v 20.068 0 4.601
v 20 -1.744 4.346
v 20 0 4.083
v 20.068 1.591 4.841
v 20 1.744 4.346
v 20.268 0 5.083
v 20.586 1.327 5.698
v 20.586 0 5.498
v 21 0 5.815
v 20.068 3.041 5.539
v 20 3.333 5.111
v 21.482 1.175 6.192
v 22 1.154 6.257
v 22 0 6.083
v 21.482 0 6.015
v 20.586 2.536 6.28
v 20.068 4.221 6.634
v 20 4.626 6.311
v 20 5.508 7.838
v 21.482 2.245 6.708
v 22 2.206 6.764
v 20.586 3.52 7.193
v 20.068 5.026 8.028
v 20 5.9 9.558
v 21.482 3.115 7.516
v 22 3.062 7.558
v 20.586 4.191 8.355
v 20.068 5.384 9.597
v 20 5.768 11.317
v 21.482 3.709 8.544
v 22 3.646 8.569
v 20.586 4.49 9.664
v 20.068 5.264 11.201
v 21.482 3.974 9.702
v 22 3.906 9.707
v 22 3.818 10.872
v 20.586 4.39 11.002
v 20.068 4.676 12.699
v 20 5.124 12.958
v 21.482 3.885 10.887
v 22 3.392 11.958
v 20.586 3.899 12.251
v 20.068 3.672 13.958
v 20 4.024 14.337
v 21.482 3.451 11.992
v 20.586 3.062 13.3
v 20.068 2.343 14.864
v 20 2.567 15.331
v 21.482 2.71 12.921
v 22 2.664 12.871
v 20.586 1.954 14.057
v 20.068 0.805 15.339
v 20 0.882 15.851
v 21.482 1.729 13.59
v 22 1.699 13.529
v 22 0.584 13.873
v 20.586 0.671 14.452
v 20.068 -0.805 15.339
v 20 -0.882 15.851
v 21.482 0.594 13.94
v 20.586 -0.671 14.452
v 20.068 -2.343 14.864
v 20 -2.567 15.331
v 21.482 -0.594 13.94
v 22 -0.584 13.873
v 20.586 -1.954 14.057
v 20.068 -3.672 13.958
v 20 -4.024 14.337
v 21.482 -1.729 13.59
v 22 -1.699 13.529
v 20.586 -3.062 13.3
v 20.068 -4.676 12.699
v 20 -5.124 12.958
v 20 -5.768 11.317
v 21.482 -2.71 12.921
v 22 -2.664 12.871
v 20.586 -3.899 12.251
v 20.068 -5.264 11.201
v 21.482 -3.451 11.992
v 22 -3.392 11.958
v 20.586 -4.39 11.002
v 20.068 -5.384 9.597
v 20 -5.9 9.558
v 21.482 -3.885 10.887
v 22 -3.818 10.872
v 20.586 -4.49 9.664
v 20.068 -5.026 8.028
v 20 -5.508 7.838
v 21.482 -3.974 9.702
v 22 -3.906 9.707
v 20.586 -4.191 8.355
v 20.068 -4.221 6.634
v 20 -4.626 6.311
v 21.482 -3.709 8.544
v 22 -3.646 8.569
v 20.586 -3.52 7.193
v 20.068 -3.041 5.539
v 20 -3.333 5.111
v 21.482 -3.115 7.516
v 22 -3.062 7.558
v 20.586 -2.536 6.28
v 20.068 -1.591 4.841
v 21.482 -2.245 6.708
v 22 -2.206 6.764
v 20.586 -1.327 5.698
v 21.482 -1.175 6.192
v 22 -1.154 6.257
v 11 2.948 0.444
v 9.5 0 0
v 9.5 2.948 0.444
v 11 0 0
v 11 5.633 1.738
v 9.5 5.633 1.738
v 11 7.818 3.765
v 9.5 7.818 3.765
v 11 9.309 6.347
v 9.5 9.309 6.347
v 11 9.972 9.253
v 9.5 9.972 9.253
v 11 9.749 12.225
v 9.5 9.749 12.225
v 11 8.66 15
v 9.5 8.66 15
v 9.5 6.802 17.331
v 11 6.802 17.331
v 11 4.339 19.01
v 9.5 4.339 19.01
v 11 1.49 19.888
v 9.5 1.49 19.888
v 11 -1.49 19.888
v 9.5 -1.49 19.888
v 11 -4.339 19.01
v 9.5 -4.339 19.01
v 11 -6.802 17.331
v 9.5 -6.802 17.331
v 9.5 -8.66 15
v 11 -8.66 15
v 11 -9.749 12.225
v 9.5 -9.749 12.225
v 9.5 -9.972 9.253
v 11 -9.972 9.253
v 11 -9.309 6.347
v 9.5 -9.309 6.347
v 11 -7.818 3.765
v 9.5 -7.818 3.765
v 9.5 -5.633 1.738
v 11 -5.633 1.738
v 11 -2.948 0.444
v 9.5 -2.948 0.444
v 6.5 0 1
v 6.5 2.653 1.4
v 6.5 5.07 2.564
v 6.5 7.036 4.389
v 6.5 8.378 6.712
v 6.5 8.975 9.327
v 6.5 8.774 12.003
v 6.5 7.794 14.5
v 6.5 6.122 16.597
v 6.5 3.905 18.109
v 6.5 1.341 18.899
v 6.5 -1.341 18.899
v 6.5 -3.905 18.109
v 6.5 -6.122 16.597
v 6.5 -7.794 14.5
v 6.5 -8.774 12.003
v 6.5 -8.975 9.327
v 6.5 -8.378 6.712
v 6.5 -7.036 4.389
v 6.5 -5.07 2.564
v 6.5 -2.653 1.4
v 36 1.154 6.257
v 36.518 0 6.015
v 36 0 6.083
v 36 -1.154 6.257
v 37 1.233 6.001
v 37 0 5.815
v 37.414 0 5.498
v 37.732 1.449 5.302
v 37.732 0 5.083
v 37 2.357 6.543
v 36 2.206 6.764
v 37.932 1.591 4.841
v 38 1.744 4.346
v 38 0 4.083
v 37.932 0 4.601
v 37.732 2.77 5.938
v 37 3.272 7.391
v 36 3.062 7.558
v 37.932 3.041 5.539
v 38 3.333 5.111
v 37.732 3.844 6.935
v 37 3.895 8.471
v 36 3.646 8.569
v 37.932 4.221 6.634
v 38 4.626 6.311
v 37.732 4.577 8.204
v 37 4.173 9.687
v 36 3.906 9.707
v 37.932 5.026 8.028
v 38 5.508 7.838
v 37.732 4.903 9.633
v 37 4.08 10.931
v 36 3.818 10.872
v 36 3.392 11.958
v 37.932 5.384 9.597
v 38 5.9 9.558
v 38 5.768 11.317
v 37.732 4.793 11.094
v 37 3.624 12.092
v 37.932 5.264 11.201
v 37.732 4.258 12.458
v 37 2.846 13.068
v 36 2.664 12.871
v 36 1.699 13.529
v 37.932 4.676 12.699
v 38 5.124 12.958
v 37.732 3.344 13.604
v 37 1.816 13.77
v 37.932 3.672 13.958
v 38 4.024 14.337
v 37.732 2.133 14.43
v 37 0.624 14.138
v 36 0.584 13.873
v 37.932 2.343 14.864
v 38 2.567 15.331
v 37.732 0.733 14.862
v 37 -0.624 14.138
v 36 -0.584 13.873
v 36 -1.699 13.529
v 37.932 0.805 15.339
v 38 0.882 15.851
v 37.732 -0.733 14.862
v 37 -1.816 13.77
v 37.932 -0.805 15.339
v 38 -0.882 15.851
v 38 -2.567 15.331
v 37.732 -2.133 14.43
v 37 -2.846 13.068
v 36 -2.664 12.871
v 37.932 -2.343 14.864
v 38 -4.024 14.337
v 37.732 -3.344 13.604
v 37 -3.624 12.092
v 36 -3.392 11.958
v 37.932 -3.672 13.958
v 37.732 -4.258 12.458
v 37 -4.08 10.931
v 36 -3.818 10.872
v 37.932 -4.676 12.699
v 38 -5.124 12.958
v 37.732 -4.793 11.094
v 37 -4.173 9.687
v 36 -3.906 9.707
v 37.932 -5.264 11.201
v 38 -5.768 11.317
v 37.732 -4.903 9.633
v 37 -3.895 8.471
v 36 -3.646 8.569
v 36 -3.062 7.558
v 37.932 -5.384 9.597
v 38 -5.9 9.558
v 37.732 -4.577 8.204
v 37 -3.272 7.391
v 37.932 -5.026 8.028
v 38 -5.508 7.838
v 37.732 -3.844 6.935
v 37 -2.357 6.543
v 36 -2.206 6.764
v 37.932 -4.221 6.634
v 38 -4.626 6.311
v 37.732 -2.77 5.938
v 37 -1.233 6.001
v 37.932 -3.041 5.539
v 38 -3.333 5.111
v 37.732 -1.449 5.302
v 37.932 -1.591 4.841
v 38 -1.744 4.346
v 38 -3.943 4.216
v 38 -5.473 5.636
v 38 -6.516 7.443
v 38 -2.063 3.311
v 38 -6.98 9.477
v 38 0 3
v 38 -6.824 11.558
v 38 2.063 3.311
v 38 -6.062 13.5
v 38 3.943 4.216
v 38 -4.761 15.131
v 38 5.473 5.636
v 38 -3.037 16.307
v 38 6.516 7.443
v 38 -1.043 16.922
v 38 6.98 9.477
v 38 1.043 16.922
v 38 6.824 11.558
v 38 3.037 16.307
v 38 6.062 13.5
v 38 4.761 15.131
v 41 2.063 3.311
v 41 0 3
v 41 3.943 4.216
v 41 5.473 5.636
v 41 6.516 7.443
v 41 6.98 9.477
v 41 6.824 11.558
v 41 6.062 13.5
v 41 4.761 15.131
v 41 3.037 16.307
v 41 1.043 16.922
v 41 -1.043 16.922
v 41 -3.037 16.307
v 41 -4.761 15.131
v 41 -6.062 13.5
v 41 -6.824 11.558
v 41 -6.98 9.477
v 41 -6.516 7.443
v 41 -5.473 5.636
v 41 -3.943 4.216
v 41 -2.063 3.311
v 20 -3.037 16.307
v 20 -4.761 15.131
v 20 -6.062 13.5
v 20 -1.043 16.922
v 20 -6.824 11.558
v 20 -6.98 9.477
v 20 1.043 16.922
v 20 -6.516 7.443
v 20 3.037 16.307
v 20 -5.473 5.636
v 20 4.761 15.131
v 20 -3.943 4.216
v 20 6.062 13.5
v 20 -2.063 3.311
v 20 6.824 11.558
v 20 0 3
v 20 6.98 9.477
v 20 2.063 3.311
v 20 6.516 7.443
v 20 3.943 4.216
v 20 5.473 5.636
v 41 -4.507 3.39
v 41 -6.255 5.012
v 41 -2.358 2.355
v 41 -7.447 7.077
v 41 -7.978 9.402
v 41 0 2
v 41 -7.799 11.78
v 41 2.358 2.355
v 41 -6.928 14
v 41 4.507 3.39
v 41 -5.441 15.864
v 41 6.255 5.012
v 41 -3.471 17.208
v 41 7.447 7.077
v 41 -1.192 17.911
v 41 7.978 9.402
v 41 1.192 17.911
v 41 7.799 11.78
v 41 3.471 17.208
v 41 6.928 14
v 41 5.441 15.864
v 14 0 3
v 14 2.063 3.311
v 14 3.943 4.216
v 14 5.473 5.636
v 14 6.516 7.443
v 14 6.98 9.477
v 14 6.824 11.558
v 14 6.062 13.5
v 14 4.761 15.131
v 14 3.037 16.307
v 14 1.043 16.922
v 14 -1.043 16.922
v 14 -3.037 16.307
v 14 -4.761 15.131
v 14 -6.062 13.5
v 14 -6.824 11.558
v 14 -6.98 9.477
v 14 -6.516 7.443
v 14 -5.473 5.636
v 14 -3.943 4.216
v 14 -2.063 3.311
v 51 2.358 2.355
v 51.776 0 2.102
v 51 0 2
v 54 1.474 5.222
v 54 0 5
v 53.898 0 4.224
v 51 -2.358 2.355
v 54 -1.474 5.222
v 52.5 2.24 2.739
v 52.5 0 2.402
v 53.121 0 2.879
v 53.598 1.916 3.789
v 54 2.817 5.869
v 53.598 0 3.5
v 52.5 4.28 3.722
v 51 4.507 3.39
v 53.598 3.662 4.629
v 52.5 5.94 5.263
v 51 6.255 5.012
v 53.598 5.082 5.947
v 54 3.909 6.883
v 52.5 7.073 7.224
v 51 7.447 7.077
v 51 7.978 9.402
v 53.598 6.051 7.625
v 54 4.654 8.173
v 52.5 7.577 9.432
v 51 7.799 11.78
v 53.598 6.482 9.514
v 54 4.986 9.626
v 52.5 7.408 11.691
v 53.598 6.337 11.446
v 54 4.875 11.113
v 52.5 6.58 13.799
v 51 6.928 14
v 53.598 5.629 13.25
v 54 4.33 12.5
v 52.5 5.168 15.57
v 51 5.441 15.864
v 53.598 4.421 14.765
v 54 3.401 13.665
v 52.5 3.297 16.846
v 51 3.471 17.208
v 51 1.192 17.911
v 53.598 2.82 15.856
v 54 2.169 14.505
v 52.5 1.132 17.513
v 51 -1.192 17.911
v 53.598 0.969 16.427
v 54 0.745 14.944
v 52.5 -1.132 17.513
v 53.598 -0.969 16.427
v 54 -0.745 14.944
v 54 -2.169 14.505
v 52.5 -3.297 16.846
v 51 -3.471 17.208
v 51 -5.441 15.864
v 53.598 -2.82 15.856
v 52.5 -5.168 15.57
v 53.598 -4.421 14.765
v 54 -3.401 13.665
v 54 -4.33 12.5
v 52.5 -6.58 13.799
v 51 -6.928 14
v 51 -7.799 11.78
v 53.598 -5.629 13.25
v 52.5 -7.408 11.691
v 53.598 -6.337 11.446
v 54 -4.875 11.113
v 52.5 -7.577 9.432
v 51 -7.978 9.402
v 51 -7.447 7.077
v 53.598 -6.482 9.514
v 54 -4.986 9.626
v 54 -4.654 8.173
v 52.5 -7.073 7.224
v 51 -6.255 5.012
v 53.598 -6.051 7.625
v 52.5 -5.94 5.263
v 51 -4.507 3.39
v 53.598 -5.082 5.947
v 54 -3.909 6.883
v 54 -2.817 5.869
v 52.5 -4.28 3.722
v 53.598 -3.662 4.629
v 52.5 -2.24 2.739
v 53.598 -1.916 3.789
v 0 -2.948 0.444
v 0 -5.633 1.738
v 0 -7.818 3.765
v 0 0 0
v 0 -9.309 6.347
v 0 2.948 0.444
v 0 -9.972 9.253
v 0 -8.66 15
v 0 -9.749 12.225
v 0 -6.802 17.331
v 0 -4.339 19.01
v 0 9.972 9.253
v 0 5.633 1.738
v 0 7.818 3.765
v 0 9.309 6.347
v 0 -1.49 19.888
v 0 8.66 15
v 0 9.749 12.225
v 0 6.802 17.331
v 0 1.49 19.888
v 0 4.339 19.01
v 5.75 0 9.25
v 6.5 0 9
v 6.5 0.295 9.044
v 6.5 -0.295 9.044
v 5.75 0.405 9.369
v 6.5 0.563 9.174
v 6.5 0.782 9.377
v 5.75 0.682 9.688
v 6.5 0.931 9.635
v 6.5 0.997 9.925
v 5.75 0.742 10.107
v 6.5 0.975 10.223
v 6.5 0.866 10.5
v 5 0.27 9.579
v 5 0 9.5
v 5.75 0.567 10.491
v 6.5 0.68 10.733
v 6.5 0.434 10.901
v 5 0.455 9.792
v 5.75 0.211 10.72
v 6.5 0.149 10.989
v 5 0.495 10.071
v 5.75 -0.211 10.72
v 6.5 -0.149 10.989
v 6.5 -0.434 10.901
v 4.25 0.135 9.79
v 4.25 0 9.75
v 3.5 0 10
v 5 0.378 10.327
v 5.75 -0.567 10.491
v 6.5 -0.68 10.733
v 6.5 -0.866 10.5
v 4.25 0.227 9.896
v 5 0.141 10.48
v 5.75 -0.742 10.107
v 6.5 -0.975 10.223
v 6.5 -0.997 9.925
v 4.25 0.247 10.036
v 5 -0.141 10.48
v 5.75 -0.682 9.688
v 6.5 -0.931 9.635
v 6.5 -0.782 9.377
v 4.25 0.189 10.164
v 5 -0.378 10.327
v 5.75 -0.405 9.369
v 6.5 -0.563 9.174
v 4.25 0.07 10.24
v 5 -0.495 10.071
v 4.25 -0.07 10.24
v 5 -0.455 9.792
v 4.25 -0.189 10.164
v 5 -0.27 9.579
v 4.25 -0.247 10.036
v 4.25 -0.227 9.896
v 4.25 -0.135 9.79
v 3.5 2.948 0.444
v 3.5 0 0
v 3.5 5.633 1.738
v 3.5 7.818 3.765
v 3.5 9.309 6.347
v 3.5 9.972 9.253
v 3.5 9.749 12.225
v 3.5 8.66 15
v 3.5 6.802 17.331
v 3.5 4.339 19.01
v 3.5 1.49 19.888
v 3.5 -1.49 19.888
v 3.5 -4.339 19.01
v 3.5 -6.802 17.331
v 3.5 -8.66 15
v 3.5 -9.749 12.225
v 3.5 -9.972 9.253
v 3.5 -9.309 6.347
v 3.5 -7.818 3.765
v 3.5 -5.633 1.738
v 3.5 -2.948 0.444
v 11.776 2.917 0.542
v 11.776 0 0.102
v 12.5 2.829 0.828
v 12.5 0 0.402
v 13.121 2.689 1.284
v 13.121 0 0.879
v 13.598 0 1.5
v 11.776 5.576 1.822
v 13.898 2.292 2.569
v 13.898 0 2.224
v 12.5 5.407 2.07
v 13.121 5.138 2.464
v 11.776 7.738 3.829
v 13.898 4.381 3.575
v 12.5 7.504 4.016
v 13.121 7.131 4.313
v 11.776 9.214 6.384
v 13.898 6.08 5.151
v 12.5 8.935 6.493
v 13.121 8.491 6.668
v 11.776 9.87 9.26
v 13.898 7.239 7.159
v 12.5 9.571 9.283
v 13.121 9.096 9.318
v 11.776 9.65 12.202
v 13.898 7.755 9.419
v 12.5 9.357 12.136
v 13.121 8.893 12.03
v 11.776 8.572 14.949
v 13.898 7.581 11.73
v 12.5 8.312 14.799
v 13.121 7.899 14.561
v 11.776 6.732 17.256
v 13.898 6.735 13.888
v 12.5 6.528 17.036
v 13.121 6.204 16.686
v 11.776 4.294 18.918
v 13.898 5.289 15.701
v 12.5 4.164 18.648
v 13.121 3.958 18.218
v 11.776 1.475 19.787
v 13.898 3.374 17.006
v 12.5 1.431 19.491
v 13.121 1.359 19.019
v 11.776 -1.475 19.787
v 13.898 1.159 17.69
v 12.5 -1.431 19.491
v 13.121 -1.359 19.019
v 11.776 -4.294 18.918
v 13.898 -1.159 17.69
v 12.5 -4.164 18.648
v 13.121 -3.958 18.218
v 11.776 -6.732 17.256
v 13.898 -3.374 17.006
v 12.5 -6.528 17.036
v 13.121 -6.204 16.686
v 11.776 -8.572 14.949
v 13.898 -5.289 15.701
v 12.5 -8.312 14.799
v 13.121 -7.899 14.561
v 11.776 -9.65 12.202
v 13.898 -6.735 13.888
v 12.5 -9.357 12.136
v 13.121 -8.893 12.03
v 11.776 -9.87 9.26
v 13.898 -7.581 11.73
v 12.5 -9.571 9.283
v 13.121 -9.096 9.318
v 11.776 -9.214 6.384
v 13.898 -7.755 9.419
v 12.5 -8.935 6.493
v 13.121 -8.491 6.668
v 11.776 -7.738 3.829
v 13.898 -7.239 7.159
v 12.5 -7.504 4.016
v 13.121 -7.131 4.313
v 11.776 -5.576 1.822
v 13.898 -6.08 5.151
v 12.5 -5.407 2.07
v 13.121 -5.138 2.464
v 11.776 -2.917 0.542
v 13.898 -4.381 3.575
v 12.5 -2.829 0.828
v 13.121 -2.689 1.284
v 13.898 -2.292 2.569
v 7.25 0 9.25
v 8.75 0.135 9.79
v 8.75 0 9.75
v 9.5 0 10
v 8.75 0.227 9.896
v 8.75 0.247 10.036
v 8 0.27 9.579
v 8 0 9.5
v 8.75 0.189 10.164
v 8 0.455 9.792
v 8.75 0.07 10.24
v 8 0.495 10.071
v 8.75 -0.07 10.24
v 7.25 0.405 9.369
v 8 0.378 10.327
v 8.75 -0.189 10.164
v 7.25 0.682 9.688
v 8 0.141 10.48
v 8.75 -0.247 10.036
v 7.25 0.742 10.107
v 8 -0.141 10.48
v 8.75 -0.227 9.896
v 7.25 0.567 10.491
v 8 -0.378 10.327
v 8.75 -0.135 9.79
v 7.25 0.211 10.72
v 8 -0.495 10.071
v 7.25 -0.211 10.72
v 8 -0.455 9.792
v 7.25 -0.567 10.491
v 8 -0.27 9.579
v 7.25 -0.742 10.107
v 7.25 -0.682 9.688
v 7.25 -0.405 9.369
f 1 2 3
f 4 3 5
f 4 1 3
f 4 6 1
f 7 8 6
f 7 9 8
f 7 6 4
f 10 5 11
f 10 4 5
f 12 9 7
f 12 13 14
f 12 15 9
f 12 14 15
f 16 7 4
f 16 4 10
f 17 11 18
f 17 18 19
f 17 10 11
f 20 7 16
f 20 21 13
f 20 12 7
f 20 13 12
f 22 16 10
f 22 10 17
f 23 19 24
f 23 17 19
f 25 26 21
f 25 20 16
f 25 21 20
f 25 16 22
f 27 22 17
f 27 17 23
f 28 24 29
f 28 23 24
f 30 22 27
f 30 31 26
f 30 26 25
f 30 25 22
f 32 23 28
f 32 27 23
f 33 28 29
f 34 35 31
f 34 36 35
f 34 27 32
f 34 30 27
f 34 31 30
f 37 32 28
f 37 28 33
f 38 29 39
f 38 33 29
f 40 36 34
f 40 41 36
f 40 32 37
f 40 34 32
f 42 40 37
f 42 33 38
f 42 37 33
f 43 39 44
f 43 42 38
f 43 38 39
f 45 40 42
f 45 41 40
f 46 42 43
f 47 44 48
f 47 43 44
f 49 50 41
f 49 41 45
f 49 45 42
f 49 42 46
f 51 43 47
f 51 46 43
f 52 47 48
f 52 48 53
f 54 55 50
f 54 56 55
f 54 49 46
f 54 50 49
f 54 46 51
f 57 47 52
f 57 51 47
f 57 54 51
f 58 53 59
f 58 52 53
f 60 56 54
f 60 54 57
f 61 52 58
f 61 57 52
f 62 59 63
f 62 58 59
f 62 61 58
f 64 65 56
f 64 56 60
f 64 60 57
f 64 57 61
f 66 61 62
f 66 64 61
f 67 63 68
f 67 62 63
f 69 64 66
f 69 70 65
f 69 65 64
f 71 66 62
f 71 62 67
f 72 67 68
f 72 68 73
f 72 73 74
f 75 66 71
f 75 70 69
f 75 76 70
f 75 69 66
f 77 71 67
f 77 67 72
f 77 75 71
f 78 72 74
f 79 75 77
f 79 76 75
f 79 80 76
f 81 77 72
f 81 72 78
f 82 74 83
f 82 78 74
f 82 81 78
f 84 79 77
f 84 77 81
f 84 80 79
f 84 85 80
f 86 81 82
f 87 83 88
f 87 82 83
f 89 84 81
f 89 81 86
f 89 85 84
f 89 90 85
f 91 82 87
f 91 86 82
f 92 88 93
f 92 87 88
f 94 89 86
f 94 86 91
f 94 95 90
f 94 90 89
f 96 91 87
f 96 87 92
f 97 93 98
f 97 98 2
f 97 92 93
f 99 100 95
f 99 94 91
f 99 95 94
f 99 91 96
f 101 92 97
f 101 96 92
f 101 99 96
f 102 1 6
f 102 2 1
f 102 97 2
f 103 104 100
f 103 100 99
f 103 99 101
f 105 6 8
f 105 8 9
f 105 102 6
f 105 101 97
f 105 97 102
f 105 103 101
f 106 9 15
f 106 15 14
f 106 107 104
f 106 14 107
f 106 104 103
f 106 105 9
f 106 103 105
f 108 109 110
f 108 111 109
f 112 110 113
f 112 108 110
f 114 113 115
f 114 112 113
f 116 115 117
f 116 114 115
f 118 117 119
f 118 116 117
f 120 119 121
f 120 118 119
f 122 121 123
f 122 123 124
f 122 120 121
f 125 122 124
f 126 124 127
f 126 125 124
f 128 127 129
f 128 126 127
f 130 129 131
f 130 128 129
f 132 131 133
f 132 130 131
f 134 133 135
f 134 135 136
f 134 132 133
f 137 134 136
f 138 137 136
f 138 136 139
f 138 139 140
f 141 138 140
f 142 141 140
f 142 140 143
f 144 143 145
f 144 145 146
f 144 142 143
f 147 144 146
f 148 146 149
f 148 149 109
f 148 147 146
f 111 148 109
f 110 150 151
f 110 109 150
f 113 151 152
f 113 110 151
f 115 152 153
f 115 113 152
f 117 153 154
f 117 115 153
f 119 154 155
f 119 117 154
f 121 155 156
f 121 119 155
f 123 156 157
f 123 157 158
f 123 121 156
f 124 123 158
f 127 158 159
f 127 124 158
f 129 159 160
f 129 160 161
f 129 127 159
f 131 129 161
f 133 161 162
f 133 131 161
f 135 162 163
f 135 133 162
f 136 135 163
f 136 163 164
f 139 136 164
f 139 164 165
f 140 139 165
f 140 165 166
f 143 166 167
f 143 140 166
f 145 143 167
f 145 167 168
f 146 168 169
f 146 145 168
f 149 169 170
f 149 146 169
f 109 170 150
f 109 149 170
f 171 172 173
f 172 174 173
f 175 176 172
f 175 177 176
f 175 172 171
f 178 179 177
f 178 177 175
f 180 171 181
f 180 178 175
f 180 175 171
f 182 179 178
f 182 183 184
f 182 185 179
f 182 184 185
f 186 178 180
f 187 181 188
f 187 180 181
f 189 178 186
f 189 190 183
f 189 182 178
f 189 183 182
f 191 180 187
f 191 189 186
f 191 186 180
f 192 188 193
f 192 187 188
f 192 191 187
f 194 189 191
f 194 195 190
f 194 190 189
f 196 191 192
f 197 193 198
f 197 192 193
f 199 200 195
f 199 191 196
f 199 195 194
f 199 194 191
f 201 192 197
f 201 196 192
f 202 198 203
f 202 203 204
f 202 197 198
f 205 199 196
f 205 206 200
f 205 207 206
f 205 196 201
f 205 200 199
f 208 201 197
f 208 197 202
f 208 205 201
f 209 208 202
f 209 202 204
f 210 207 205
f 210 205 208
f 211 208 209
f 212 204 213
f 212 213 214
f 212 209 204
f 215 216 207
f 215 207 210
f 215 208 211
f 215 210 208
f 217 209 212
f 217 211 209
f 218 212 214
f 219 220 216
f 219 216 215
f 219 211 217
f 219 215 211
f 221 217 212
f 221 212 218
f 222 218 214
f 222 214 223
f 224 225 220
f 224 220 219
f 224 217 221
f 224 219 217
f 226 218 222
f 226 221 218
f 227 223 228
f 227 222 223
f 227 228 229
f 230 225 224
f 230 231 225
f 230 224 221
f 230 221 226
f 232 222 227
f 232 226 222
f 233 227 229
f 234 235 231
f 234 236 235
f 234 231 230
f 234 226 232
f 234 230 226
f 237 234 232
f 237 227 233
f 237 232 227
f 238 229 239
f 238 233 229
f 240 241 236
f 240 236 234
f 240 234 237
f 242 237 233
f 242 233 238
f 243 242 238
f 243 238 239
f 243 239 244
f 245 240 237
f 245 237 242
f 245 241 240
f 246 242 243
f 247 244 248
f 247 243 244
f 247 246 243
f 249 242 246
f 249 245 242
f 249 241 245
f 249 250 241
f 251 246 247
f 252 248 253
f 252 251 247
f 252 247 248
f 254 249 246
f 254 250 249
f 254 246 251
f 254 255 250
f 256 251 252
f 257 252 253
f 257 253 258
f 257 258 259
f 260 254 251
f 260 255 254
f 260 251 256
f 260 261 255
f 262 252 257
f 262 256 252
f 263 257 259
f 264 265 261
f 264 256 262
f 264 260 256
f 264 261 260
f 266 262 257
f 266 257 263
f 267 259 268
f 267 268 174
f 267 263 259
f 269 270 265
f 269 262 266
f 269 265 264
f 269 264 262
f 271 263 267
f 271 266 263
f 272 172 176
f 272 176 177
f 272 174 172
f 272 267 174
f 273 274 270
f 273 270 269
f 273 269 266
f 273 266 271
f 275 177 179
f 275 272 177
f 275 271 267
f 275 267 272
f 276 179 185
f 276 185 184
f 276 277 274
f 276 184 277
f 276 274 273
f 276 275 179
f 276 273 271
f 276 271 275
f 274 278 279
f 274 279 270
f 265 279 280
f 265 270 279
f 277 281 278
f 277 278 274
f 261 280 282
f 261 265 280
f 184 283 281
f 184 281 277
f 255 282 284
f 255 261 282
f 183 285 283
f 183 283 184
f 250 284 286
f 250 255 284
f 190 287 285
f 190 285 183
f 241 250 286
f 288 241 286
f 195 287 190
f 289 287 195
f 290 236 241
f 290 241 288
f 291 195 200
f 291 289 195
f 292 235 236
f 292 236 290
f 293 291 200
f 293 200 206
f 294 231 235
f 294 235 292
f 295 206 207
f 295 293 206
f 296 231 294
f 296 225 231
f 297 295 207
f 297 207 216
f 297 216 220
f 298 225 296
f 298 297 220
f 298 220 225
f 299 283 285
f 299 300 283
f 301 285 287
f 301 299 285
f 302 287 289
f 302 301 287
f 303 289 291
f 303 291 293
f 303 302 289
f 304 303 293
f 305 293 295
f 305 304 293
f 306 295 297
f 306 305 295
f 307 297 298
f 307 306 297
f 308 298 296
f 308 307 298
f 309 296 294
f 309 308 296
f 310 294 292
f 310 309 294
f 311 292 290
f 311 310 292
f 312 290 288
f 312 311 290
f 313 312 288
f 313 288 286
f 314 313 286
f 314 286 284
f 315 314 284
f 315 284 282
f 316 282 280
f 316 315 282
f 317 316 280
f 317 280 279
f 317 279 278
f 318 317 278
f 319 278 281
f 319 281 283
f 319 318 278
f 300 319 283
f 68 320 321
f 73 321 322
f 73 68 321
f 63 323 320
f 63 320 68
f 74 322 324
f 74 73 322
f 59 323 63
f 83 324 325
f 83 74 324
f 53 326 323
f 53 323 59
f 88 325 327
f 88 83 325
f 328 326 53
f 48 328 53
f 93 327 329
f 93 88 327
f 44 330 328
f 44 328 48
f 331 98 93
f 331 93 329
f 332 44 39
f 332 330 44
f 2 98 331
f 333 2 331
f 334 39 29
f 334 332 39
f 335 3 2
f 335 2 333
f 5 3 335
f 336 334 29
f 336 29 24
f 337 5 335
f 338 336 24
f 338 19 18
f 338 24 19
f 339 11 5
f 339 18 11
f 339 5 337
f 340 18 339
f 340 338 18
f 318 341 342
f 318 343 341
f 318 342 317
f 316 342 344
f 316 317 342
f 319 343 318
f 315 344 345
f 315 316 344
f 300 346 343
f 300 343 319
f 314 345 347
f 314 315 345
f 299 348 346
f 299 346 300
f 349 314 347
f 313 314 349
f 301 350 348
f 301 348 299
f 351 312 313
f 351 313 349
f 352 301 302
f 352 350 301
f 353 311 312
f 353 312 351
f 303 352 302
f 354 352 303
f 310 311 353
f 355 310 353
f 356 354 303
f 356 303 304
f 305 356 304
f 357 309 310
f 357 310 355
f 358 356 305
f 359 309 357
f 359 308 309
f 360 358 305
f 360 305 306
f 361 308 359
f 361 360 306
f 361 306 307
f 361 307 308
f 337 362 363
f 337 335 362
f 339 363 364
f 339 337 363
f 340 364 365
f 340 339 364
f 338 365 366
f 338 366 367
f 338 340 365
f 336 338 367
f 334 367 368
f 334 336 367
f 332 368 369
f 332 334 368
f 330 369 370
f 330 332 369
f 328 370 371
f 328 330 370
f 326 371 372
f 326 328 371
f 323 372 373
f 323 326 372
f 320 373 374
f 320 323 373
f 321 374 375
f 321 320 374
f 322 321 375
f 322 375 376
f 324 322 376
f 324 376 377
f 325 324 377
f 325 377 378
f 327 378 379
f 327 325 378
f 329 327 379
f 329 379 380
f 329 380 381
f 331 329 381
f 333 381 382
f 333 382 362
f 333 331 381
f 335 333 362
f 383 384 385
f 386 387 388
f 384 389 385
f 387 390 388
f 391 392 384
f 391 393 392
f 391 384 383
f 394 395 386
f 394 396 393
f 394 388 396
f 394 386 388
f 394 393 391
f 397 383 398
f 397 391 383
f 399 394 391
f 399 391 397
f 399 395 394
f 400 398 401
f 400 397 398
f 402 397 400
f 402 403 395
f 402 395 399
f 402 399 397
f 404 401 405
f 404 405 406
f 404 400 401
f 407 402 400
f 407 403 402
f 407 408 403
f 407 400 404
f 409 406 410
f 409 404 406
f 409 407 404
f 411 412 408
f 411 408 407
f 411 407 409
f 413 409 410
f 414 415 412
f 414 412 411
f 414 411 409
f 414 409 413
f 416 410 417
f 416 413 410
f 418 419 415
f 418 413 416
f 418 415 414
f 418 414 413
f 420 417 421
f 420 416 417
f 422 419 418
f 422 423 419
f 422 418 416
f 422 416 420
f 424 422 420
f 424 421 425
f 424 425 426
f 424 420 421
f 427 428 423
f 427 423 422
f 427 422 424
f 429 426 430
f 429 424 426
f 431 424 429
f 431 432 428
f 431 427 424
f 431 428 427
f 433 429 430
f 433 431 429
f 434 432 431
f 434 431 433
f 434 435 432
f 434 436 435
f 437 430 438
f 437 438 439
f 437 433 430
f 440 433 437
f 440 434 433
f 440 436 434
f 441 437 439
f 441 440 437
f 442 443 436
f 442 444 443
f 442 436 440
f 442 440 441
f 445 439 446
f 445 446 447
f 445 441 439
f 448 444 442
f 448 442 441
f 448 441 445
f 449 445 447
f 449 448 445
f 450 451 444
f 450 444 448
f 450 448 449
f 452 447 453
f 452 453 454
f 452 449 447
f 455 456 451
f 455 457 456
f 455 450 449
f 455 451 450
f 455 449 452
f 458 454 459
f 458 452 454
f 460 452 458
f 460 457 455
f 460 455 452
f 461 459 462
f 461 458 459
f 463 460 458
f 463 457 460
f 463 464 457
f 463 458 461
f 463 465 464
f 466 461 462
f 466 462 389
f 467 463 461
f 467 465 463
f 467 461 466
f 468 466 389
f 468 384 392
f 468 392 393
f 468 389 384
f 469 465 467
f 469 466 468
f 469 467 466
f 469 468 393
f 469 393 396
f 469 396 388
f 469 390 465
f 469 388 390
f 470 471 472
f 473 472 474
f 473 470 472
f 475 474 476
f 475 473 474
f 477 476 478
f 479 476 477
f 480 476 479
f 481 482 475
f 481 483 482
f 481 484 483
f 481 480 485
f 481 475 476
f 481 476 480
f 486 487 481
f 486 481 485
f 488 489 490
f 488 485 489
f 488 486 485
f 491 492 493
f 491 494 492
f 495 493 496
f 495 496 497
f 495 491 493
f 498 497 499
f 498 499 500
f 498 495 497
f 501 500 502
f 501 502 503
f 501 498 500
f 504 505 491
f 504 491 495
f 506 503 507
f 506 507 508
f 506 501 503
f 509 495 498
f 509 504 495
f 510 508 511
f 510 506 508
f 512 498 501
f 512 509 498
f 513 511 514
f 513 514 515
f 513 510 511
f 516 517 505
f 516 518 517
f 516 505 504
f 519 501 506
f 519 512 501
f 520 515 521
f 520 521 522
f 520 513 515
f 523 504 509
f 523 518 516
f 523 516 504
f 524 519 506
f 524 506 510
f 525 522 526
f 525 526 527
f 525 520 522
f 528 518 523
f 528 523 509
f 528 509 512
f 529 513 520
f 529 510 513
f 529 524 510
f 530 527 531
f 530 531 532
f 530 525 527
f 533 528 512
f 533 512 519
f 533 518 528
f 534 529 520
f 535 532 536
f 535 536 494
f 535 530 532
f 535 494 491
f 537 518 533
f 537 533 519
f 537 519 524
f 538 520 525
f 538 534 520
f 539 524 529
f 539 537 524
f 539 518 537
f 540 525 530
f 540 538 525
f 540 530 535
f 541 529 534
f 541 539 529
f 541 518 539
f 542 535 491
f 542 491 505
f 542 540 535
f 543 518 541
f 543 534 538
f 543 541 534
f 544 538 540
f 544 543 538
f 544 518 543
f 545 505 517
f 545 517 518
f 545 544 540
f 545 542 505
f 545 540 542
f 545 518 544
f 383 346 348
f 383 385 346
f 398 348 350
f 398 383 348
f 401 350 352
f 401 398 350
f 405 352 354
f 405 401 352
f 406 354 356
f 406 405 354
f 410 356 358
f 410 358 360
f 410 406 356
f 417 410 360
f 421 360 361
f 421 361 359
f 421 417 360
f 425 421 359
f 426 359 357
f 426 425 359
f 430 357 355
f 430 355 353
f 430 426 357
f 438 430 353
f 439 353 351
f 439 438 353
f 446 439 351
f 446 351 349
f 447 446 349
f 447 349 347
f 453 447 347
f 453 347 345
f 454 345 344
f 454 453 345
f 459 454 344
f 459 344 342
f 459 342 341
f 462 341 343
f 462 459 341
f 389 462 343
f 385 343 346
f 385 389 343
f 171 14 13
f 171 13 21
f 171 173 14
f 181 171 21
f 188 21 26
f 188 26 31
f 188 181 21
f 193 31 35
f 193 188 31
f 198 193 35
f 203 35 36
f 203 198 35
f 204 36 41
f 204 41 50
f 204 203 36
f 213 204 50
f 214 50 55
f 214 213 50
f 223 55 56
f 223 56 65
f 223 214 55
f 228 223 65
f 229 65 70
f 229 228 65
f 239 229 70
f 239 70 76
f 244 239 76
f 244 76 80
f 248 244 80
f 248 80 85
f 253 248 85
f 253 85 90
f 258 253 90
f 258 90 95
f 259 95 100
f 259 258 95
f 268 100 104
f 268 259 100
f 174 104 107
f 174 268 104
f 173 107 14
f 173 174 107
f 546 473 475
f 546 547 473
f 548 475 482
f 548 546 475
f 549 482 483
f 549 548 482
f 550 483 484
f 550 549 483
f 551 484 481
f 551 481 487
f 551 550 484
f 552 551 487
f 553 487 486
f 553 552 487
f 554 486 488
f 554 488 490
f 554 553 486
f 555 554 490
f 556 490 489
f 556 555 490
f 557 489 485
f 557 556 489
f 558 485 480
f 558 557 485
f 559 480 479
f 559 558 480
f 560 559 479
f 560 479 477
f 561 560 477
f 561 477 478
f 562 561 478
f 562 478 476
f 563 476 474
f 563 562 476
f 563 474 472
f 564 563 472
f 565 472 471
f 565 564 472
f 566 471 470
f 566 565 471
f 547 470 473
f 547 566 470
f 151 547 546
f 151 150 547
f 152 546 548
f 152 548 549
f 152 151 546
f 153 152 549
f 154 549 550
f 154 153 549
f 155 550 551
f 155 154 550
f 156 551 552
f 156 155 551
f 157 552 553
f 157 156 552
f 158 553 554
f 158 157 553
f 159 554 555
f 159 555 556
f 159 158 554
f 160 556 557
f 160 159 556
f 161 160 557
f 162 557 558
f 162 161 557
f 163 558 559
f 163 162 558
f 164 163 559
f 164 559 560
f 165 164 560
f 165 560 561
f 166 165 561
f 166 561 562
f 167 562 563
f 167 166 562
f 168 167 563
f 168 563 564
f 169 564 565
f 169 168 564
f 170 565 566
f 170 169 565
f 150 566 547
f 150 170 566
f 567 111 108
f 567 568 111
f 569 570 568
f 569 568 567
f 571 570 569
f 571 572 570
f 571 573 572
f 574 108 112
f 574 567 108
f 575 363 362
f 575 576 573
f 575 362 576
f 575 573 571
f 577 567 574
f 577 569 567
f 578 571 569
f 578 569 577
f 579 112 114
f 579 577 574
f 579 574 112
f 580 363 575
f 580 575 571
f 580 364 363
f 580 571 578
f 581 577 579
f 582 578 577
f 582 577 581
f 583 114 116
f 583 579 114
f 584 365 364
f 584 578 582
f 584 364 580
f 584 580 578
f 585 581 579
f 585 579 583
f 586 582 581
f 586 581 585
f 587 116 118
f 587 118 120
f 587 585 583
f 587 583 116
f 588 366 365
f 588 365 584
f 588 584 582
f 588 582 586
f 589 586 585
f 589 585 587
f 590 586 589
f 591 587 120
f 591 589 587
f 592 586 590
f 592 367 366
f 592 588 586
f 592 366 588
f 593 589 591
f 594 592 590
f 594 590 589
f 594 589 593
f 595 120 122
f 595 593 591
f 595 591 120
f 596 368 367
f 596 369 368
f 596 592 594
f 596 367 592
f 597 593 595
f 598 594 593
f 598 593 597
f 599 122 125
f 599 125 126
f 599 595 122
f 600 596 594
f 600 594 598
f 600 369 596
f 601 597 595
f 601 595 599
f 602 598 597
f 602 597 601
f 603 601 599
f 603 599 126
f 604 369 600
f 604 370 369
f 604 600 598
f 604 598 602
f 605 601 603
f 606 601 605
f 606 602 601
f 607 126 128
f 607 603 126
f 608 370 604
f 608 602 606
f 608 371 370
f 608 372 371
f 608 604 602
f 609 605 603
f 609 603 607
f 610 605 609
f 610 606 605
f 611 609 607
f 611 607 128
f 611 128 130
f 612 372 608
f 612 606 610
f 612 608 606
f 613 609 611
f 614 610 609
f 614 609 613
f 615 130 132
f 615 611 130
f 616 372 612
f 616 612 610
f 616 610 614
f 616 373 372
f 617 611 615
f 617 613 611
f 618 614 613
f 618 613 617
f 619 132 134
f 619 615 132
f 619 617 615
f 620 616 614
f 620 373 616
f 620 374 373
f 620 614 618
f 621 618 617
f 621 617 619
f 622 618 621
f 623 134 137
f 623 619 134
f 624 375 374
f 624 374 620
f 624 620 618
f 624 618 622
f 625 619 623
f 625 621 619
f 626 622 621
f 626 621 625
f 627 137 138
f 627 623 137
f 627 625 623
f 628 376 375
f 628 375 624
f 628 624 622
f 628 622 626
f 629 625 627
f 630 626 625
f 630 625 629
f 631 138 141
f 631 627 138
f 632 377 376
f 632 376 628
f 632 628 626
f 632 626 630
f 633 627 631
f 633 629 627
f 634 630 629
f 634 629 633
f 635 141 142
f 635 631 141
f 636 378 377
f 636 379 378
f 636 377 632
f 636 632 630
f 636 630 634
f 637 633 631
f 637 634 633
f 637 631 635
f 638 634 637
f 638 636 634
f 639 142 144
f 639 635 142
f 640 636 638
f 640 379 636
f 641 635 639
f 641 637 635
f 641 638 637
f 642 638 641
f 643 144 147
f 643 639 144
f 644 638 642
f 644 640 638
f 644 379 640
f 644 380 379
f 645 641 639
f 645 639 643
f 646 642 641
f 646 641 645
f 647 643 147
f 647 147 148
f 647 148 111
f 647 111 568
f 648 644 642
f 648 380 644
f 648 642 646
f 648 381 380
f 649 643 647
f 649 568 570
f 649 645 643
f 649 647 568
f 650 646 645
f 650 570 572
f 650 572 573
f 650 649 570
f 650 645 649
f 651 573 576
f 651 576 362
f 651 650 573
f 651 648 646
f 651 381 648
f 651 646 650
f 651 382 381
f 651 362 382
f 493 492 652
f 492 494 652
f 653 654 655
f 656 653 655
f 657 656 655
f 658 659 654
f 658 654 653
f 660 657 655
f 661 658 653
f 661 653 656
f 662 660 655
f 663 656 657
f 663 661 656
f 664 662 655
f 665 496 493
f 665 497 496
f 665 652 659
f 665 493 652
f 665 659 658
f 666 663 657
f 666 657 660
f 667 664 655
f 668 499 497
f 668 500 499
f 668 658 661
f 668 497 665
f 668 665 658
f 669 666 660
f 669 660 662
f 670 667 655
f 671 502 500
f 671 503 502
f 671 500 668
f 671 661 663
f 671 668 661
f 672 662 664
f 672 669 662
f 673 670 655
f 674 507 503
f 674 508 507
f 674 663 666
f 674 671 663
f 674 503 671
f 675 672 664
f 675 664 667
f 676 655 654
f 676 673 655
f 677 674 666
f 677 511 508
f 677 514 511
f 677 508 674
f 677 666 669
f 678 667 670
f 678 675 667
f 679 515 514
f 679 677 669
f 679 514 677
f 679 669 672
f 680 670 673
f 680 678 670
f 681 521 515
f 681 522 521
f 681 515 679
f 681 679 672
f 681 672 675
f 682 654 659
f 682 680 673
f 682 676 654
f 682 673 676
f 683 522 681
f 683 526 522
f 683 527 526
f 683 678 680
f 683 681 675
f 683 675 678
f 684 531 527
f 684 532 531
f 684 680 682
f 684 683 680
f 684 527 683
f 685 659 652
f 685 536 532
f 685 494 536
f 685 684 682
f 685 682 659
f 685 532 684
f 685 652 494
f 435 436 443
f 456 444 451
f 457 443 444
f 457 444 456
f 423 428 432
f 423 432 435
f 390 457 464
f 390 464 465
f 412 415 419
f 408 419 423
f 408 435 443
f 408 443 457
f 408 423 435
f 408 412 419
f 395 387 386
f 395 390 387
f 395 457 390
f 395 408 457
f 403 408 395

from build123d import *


with BuildPart() as f1:
    # F0 (on Front) → F1 (revolve)
    with BuildSketch(Plane.XZ):
        with BuildLine():
            Line((0, 10), (0, 0))
            Line((0, 0), (3.5, 0))
            Line((3.5, 0), (6.5, 1))
            Line((6.5, 1), (9.5, 0))
            Line((9.5, 0), (11, 0))
            ThreePointArc((11, 0), (13.12132, 0.87868), (14, 3))
            Line((14, 3), (20, 3))
            Line((20, 3), (20, 4.083384))
            ThreePointArc((20, 4.083384), (20.585786, 5.497598), (22, 6.083384))
            Line((22, 6.083384), (36, 6.083384))
            ThreePointArc((36, 6.083384), (37.414214, 5.497598), (38, 4.083384))
            Line((38, 4.083384), (38, 3))
            Line((38, 3), (41, 3))
            Line((41, 3), (41, 2))
            Line((41, 2), (51, 2))
            ThreePointArc((51, 2), (53.12132, 2.87868), (54, 5))
            Line((54, 5), (54, 10))
            Line((54, 10), (41, 10))
            Line((41, 10), (38, 10))
            Line((38, 10), (20, 10))
            Line((20, 10), (14, 10))
            Line((14, 10), (9.5, 10))
            Line((9.5, 10), (6.5, 9))
            Line((6.5, 9), (3.5, 10))
            Line((3.5, 10), (0, 10))
        make_face()
    revolve(axis=Axis((26.417072, 0, 10), (1, 0, 0)))


solid = f1.part
